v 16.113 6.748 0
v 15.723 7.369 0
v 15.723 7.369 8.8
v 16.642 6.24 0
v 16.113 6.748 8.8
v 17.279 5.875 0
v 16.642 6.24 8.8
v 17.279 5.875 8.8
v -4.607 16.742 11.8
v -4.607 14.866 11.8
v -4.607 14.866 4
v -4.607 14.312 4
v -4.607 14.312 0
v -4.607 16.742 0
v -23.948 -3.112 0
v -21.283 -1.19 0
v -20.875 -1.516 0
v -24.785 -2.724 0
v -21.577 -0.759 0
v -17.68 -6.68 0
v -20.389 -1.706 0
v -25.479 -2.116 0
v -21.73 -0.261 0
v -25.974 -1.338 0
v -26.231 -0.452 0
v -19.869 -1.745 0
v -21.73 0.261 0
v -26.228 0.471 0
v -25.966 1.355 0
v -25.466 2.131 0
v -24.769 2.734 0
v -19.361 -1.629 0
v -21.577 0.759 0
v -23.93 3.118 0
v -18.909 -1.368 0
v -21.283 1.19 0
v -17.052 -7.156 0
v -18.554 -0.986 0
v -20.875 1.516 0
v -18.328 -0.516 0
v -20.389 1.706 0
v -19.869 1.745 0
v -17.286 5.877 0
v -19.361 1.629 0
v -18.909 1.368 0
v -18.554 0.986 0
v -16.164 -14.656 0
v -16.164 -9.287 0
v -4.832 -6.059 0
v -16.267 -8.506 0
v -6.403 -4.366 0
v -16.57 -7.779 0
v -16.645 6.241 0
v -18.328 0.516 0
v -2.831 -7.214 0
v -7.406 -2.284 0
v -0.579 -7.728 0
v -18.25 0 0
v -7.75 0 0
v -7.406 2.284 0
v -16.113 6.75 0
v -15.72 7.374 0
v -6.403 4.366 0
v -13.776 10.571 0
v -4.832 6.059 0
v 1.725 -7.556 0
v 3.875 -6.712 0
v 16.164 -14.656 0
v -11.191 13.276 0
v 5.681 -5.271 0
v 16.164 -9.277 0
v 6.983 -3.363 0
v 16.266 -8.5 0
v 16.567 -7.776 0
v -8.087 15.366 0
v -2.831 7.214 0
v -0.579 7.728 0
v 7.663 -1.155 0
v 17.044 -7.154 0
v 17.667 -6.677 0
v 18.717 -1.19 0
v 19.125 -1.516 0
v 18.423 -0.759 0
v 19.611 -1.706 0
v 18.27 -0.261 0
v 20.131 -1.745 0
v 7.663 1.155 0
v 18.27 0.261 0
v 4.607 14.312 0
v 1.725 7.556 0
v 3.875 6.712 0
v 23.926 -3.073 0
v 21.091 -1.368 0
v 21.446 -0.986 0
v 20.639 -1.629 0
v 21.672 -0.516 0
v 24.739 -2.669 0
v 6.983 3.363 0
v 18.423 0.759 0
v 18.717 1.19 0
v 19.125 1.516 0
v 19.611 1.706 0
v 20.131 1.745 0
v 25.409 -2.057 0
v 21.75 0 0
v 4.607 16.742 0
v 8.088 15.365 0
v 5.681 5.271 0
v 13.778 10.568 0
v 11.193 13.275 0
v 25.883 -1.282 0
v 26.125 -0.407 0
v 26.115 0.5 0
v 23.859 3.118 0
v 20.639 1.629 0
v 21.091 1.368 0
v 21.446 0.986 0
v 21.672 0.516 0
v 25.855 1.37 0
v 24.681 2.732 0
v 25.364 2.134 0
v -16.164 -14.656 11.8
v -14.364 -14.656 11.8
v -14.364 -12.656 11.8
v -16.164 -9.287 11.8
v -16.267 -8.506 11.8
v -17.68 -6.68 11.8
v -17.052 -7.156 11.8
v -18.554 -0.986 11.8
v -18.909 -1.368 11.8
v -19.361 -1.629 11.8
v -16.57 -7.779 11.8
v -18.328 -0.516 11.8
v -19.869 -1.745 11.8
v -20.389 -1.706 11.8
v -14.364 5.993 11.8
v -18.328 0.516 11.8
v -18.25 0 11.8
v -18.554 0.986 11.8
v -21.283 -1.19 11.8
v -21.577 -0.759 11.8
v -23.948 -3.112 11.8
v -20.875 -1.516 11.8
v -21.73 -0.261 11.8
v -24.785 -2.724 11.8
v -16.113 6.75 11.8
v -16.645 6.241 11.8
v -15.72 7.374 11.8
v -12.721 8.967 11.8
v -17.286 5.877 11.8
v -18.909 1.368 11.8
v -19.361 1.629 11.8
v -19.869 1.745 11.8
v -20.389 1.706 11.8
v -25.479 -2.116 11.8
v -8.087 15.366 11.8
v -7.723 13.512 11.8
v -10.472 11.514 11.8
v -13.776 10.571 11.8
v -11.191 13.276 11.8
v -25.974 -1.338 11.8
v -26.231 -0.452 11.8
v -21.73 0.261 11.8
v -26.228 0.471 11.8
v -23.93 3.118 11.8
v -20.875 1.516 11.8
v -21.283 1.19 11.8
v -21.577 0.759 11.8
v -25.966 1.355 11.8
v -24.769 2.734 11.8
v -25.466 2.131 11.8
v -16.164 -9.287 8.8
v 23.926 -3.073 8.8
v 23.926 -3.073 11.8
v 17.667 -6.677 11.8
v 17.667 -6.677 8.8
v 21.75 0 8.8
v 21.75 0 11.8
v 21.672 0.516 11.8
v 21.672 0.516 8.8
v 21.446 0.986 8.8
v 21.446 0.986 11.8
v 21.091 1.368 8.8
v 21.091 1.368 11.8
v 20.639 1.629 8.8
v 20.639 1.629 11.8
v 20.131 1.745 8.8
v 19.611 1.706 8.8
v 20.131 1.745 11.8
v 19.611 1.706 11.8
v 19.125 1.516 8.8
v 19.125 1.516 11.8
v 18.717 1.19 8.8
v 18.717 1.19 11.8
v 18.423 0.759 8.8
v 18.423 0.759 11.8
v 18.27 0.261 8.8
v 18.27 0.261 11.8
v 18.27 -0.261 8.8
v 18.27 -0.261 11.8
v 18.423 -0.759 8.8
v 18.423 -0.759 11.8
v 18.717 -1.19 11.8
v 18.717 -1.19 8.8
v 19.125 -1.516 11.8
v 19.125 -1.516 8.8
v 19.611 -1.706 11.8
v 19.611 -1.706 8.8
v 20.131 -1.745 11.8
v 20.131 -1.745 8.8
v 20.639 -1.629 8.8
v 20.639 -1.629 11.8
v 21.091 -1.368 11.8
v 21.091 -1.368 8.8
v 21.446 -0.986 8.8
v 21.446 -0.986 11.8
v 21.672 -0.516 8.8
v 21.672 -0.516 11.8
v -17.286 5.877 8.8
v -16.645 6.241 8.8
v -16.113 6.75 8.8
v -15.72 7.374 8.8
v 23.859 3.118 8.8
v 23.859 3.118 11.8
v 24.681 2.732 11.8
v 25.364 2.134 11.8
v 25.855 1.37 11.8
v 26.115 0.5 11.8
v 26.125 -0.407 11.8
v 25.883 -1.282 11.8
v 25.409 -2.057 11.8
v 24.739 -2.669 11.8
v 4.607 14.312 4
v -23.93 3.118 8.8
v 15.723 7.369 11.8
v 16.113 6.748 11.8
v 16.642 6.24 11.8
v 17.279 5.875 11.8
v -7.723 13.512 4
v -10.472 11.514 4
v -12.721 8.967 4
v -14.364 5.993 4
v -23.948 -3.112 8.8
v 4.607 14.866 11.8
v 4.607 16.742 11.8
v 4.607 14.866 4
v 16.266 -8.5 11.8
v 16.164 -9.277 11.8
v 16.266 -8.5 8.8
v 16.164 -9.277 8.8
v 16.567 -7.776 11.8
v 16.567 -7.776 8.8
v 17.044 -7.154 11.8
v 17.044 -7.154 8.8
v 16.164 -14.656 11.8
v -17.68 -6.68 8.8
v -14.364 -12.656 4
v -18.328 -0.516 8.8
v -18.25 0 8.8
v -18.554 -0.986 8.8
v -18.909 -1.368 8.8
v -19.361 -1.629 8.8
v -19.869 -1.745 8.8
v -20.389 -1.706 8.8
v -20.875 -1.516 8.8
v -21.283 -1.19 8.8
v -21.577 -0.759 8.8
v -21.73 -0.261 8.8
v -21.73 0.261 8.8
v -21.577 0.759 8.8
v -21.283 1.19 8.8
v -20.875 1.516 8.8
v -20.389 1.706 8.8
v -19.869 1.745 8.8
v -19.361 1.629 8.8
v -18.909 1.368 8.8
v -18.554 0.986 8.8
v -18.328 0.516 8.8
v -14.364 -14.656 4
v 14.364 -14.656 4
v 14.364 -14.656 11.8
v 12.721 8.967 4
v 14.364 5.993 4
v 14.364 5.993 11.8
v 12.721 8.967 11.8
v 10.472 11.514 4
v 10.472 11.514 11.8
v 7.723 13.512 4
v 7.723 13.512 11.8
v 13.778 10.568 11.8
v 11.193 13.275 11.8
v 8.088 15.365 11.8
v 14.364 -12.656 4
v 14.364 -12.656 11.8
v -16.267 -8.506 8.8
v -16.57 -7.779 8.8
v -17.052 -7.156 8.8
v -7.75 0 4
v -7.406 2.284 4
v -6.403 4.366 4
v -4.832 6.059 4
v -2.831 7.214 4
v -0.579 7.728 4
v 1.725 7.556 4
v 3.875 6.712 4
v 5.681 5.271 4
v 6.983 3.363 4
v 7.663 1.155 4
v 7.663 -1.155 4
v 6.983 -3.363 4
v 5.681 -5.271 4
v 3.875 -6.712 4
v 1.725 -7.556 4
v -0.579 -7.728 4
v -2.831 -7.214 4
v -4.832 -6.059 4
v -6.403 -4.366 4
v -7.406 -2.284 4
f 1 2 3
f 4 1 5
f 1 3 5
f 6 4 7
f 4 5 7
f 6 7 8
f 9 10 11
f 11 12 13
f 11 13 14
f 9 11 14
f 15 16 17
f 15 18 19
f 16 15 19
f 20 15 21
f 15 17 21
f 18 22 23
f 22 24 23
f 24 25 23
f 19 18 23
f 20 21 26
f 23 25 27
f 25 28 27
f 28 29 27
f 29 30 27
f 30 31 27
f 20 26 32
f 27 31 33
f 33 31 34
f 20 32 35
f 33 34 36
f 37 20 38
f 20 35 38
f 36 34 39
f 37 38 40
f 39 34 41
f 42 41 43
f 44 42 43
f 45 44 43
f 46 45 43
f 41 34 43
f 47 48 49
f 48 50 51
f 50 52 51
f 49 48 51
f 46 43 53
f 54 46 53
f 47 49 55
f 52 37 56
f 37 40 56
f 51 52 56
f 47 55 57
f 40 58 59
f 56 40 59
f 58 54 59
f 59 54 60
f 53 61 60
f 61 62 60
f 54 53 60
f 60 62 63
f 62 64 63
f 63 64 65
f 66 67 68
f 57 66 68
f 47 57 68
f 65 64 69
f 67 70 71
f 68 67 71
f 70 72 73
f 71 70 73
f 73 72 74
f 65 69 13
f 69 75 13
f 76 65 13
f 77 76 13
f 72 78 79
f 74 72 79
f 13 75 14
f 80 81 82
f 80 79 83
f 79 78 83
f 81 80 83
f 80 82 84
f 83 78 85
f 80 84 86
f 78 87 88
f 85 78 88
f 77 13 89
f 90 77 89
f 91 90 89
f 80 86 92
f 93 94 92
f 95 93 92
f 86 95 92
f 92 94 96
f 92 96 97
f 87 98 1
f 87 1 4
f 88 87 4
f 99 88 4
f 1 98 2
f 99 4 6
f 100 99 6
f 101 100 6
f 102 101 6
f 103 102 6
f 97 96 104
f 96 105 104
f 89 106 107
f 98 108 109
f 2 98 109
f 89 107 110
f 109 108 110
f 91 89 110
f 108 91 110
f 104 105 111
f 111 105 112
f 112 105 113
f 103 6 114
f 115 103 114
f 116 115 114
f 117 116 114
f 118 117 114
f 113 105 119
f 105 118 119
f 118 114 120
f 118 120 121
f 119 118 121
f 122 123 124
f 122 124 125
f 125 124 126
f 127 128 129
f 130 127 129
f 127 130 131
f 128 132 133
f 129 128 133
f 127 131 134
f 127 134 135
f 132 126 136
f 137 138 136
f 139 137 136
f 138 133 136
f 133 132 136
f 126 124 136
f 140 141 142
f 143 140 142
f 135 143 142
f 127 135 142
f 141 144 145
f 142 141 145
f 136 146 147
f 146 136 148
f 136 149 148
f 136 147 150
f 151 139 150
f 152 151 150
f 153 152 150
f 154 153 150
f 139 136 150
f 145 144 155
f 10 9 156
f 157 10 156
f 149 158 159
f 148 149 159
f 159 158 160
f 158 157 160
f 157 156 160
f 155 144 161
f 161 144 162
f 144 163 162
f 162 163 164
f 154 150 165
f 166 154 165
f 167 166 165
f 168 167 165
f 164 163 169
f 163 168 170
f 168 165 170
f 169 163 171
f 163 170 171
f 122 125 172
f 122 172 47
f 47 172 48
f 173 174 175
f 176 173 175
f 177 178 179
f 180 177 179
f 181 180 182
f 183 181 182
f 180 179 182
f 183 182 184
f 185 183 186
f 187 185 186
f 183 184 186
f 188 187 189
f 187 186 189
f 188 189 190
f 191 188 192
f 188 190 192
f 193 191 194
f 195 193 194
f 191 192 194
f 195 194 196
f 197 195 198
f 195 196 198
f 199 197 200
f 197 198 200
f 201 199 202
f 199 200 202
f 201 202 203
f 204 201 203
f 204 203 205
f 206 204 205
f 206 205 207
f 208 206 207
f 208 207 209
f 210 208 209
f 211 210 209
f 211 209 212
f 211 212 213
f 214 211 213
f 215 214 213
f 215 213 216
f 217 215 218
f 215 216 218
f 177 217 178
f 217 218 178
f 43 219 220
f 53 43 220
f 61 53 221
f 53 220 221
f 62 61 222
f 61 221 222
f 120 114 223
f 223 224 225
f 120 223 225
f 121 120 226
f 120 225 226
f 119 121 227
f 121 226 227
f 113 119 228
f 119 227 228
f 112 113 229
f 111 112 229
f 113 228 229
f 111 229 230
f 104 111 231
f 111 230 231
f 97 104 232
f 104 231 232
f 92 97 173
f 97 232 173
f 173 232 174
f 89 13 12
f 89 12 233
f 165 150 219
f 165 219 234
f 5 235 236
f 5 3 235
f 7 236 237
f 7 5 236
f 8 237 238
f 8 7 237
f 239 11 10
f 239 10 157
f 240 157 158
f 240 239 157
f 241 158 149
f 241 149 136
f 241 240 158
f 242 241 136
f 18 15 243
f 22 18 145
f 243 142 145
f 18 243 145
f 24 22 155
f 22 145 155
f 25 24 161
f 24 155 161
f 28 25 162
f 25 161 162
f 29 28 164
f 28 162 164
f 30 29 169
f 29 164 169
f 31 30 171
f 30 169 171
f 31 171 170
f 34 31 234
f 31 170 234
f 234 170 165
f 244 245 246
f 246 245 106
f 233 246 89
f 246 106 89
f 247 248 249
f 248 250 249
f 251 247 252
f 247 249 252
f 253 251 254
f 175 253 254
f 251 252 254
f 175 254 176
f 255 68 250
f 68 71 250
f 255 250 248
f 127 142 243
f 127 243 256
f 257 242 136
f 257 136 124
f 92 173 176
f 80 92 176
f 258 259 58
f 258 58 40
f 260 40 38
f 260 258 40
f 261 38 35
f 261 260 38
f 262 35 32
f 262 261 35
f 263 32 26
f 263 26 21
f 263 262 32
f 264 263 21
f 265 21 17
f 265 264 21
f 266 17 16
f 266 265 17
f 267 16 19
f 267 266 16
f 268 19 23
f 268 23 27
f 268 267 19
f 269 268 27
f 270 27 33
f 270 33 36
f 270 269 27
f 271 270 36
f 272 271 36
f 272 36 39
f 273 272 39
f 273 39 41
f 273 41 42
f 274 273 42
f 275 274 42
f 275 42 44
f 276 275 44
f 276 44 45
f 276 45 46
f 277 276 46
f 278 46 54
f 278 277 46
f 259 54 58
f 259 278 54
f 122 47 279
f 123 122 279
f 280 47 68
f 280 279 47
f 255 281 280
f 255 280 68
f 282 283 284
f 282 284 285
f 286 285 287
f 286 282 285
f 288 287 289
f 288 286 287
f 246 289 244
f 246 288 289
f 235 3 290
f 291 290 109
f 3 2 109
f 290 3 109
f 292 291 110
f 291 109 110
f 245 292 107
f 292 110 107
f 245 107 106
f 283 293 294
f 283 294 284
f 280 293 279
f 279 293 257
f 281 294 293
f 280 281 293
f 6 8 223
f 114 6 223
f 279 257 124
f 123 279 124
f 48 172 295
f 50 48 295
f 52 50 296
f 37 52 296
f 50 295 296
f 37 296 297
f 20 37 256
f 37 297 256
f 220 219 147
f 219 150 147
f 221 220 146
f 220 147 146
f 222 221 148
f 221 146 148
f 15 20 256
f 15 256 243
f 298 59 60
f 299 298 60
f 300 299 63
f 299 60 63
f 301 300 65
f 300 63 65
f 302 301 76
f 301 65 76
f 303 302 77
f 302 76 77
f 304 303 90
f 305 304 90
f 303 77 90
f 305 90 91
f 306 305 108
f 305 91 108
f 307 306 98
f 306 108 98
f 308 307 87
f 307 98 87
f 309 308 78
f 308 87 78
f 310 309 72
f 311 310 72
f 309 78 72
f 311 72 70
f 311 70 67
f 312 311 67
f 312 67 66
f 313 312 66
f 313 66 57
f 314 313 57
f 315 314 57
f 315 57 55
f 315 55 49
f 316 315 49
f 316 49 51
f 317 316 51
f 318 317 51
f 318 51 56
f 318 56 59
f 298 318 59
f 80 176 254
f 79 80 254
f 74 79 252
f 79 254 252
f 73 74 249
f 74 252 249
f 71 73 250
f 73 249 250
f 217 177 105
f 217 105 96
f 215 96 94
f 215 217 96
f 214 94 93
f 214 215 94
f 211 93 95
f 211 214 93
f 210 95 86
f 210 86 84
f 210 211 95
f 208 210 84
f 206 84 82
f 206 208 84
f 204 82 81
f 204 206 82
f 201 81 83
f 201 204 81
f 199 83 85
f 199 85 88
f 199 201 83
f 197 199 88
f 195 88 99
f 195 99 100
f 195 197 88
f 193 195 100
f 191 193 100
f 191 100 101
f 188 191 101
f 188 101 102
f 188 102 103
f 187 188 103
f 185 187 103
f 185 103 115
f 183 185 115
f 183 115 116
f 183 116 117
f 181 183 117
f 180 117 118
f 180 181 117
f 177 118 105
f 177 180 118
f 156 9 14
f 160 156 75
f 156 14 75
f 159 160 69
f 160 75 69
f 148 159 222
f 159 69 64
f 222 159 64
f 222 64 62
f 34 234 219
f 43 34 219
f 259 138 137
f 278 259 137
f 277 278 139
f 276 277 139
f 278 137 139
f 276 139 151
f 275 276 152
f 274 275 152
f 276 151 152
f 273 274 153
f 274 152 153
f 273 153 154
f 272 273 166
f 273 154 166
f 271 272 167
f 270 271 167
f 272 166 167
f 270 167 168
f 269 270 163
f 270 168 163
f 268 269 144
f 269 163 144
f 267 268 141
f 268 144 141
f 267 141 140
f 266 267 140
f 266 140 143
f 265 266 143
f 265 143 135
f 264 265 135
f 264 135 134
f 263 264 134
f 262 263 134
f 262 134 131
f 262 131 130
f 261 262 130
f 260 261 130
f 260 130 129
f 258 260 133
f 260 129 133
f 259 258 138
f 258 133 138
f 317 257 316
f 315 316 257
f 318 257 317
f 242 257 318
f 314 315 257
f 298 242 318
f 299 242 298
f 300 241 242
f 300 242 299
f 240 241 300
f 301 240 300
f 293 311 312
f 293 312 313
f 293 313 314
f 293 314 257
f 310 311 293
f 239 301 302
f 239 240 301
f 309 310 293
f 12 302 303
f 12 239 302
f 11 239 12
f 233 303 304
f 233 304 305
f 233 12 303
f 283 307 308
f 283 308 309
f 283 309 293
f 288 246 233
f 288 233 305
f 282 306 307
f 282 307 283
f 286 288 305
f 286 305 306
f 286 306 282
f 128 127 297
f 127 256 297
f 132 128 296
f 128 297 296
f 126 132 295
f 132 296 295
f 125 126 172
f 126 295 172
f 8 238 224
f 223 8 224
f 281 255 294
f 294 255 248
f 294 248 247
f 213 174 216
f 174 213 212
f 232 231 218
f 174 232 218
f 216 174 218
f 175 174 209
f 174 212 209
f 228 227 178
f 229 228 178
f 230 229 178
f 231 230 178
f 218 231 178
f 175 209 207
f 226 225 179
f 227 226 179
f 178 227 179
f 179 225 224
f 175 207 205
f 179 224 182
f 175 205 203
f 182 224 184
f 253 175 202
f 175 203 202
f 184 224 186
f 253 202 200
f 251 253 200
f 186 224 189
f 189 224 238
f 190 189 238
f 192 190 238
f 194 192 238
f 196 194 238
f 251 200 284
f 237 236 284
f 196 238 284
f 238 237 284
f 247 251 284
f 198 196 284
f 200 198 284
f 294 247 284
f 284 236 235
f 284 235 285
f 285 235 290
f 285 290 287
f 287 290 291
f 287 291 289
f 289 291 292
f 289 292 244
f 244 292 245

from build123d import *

# Parameters (mm, degrees)
BOSS_EXTRUDE1_DEPTH = 4
BOSS_EXTRUDE2_DEPTH = 7.8
SKETCH4_W           = 33.781239108
SKETCH4_H           = 10.810531084
CUT_EXTRUDE1_DEPTH  = 28.88035773
SKETCH6_R           = 1.75
BOSS_EXTRUDE3_DEPTH = 3
FILLET1_R           = 3
CUT_EXTRUDE2_REACH  = 35.305
SKETCH7_R           = 7.75
SKETCH8_R           = 1.75
BOSS_EXTRUDE4_DEPTH = 8.8
BOSS_EXTRUDE5_DEPTH = 2


with BuildPart() as part:
    # Sketch2 → Boss-Extrude1 (new body)
    with BuildSketch(Plane.XY):
        with BuildLine():
            Line((3.481334242, 16.311673717), (-3.481334242, 16.311673717))
            Line((-3.481334242, 16.311673717), (-4.292170887, 16.824998456))
            ThreePointArc((-4.292170887, 16.824998456), (-11.492625639, 13.016253681), (-16.163850494, 6.342967853))
            Line((-16.163850494, 6.342967853), (-16.163850494, -14.391495343))
            Line((-16.163850494, -14.391495343), (-14.353897969, -14.640433541))
            Line((-14.353897969, -14.640433541), (-10.527602773, -17.523753782))
            Line((-10.527602773, -17.523753782), (-10.527602773, -19.404011272))
            Line((-10.527602773, -19.404011272), (-5.007128349, -19.404011272))
            Line((-5.007128349, -19.404011272), (-5.007128349, -17.507596758))
            Line((-5.007128349, -17.507596758), (5, -17.507596758))
            Line((5, -17.507596758), (5, -19.411447251))
            Line((5, -19.411447251), (10.467237067, -19.411447251))
            Line((10.467237067, -19.411447251), (10.467237067, -17.567178369))
            Line((10.467237067, -17.567178369), (14.33922382, -14.64942707))
            Line((14.33922382, -14.64942707), (16.163850494, -14.424396197))
            Line((16.163850494, -14.424396197), (16.163850494, 6.342967853))
            ThreePointArc((16.163850494, 6.342967853), (11.492625639, 13.016253681), (4.292170887, 16.824998456))
            Line((4.292170887, 16.824998456), (3.481334242, 16.311673717))
        make_face()
    extrude(amount=BOSS_EXTRUDE1_DEPTH)

    # Sketch3 → Boss-Extrude2 (add)
    with BuildSketch(Plane.XY.offset(4)):
        with BuildLine():
            Line((4.292170887, 16.824998456), (3.481334242, 16.311673717))
            Line((3.481334242, 16.311673717), (-3.481334242, 16.311673717))
            Line((-3.481334242, 16.311673717), (-4.292170887, 16.824998456))
            ThreePointArc((-4.292170887, 16.824998456), (-11.492625639, 13.016253681), (-16.163850494, 6.342967853))
            Line((-16.163850494, 6.342967853), (-16.163850494, -14.391495343))
            Line((-16.163850494, -14.391495343), (-14.353897969, -14.640433541))
            Line((-14.353897969, -14.640433541), (-10.527602773, -17.523753782))
            Line((-10.527602773, -17.523753782), (-10.527602773, -19.404011272))
            Line((-10.527602773, -19.404011272), (-5.007128349, -19.404011272))
            Line((-5.007128349, -19.404011272), (-5.007128349, -17.507596758))
            Line((-5.007128349, -17.507596758), (5, -17.507596758))
            Line((5, -17.507596758), (5, -19.411447251))
            Line((5, -19.411447251), (10.467237067, -19.411447251))
            Line((10.467237067, -19.411447251), (10.467237067, -17.567178369))
            Line((10.467237067, -17.567178369), (14.33922382, -14.64942707))
            Line((14.33922382, -14.64942707), (16.163850494, -14.424396197))
            Line((16.163850494, -14.424396197), (16.163850494, 6.342967853))
            ThreePointArc((16.163850494, 6.342967853), (11.492625639, 13.016253681), (4.292170887, 16.824998456))
        make_face()
        with BuildLine():
            Line((4.003211271, 14.511673717), (-4.003211271, 14.511673717))
            Line((-4.003211271, 14.511673717), (-4.577751285, 14.875403704))
            ThreePointArc((-4.577751285, 14.875403704), (-10.460467666, 11.524411412), (-14.363850494, 5.992765737))
            Line((-14.363850494, 5.992765737), (-14.363850494, -12.822119288))
            Line((-14.363850494, -12.822119288), (-13.644664568, -12.921035058))
            Line((-13.644664568, -12.921035058), (-8.727602773, -16.626306888))
            Line((-8.727602773, -16.626306888), (-8.727602773, -17.604011272))
            Line((-8.727602773, -17.604011272), (-6.807128349, -17.604011272))
            Line((-6.807128349, -17.604011272), (-6.807128349, -15.707596758))
            Line((-6.807128349, -15.707596758), (6.8, -15.707596758))
            Line((6.8, -15.707596758), (6.8, -17.611447251))
            Line((6.8, -17.611447251), (8.667237067, -17.611447251))
            Line((8.667237067, -17.611447251), (8.667237067, -16.669731475))
            Line((8.667237067, -16.669731475), (13.640731753, -12.921934411))
            Line((13.640731753, -12.921934411), (14.363850494, -12.832752309))
            Line((14.363850494, -12.832752309), (14.363850494, 5.992765737))
            ThreePointArc((14.363850494, 5.992765737), (10.460467666, 11.524411412), (4.577751285, 14.875403704))
            Line((4.577751285, 14.875403704), (4.003211271, 14.511673717))
        make_face(mode=Mode.SUBTRACT)
    extrude(amount=BOSS_EXTRUDE2_DEPTH)

    # Sketch4 → Cut-Extrude1 (cut, through all)
    with BuildSketch(Plane(origin=(0, 0, 0), x_dir=(-1, 0, 0), z_dir=(0, 0, -1))):
        Polygon((-4.606626741, 14.656974178), (-4.606626741, 16.741633553), (-2.485703279, 20.488617531), (2.721605339, 20.671050509), (4.606626741, 16.741633553), (4.606626741, 14.656974178), (4.606626741, 14.311673717), (-4.606626741, 14.311673717), align=None)
        with Locations((0.72676906, -18.06116853)):
            Rectangle(SKETCH4_W, SKETCH4_H)
    extrude(amount=-CUT_EXTRUDE1_DEPTH, mode=Mode.SUBTRACT)

    # Sketch6 → Boss-Extrude3 (add)
    with BuildSketch(Plane.XY.offset(11.8)):
        with BuildLine():
            Line((-16.163850494, -7.542701658), (-16.163850494, 6.342967853))
            Line((-16.163850494, 6.342967853), (-23.929756214, 3.11778647))
            ThreePointArc((-23.929756214, 3.11778647), (-26.262186338, 0.009769983), (-23.948484604, -3.11221353))
            Line((-23.948484604, -3.11221353), (-16.163850494, -7.542701658))
        make_face()
        with Locations((-20, 0)):
            Circle(SKETCH6_R, mode=Mode.SUBTRACT)
        with BuildLine():
            Line((16.163850494, -7.542701658), (16.163850494, 6.342967853))
            Line((16.163850494, 6.342967853), (23.859195057, 3.11778647))
            ThreePointArc((23.859195057, 3.11778647), (26.152039317, 0.046872999), (23.925870502, -3.072712992))
            Line((23.925870502, -3.072712992), (16.163850494, -7.542701658))
        make_face()
        with Locations((20, 0)):
            Circle(SKETCH6_R, mode=Mode.SUBTRACT)
    extrude(amount=-BOSS_EXTRUDE3_DEPTH)

    # Fillet1
    fillet1_edges = [part.edges().sort_by_distance(p)[0] for p in [
        (16.163850494, -7.542701658, 10.3),
        (-16.163850494, -7.542701658, 10.3),
        (16.163850494, 6.342967853, 10.3),
        (-16.163850494, 6.342967853, 10.3),
    ]]
    fillet(fillet1_edges, radius=FILLET1_R)

    # Sketch7 → Cut-Extrude2 (cut, up to next)
    with BuildSketch(Plane(origin=(0, 0, 0), x_dir=(-1, 0, 0), z_dir=(0, 0, -1)), mode=Mode.PRIVATE) as cut_extrude2_sk1:
        Circle(SKETCH7_R)
    cut_extrude2_tool1 = extrude(cut_extrude2_sk1.sketch, amount=-CUT_EXTRUDE2_REACH, mode=Mode.PRIVATE) & part.part
    add(cut_extrude2_tool1.solids().sort_by_distance((0, 0, 0))[0], mode=Mode.SUBTRACT)

    # Sketch8 → Boss-Extrude4 (add)
    with BuildSketch(Plane(origin=(0, 0, 8.8), x_dir=(-1, 0, 0), z_dir=(0, 0, -1))):
        with BuildLine():
            Line((-17.279436212, 5.875416821), (-23.859195057, 3.11778647))
            ThreePointArc((-23.859195057, 3.11778647), (-26.152039317, 0.046872999), (-23.925870502, -3.072712992))
            Line((-23.925870502, -3.072712992), (-17.666718993, -6.677230408))
            ThreePointArc((-17.666718993, -6.677230408), (-16.566602479, -7.775527074), (-16.163850494, -9.276960639))
            Line((-16.163850494, -9.276960639), (-16.163850494, 6.342967853))
            ThreePointArc((-16.163850494, 6.342967853), (-15.951477639, 6.859567413), (-15.722599163, 7.369069108))
            ThreePointArc((-15.722599163, 7.369069108), (-16.362099709, 6.477448451), (-17.279436212, 5.875416821))
        make_face()
        with Locations(Location((-20, 0, 0), (0, 0, 180))):
            Circle(SKETCH8_R, mode=Mode.SUBTRACT)
        with BuildLine():
            Line((17.679948892, -6.679840815), (23.948484604, -3.11221353))
            ThreePointArc((23.948484604, -3.11221353), (26.262186338, 0.009769983), (23.929756214, 3.11778647))
            Line((23.929756214, 3.11778647), (17.285932986, 5.876966887))
            ThreePointArc((17.285932986, 5.876966887), (16.363441184, 6.479081897), (15.720481601, 7.373585437))
            ThreePointArc((15.720481601, 7.373585437), (15.9504922, 6.861858534), (16.163850494, 6.342967853))
            Line((16.163850494, 6.342967853), (16.163850494, -9.287145177))
            ThreePointArc((16.163850494, -9.287145177), (16.570425653, -7.779117459), (17.679948892, -6.679840815))
        make_face()
        with Locations(Location((20, 0, 0), (0, 0, 180))):
            Circle(SKETCH8_R, mode=Mode.SUBTRACT)
    extrude(amount=BOSS_EXTRUDE4_DEPTH)

    # Sketch9 → Boss-Extrude5 (add)
    with BuildSketch(Plane.XZ.offset(12.655902988)):
        Polygon((-16.163850494, 0), (16.163850494, 0), (16.163850494, 11.8), (14.363850494, 11.8), (14.363850494, 4), (-14.363850494, 4), (-14.363850494, 11.8), (-16.163850494, 11.8), align=None)
    extrude(amount=BOSS_EXTRUDE5_DEPTH)


solid = part.part
